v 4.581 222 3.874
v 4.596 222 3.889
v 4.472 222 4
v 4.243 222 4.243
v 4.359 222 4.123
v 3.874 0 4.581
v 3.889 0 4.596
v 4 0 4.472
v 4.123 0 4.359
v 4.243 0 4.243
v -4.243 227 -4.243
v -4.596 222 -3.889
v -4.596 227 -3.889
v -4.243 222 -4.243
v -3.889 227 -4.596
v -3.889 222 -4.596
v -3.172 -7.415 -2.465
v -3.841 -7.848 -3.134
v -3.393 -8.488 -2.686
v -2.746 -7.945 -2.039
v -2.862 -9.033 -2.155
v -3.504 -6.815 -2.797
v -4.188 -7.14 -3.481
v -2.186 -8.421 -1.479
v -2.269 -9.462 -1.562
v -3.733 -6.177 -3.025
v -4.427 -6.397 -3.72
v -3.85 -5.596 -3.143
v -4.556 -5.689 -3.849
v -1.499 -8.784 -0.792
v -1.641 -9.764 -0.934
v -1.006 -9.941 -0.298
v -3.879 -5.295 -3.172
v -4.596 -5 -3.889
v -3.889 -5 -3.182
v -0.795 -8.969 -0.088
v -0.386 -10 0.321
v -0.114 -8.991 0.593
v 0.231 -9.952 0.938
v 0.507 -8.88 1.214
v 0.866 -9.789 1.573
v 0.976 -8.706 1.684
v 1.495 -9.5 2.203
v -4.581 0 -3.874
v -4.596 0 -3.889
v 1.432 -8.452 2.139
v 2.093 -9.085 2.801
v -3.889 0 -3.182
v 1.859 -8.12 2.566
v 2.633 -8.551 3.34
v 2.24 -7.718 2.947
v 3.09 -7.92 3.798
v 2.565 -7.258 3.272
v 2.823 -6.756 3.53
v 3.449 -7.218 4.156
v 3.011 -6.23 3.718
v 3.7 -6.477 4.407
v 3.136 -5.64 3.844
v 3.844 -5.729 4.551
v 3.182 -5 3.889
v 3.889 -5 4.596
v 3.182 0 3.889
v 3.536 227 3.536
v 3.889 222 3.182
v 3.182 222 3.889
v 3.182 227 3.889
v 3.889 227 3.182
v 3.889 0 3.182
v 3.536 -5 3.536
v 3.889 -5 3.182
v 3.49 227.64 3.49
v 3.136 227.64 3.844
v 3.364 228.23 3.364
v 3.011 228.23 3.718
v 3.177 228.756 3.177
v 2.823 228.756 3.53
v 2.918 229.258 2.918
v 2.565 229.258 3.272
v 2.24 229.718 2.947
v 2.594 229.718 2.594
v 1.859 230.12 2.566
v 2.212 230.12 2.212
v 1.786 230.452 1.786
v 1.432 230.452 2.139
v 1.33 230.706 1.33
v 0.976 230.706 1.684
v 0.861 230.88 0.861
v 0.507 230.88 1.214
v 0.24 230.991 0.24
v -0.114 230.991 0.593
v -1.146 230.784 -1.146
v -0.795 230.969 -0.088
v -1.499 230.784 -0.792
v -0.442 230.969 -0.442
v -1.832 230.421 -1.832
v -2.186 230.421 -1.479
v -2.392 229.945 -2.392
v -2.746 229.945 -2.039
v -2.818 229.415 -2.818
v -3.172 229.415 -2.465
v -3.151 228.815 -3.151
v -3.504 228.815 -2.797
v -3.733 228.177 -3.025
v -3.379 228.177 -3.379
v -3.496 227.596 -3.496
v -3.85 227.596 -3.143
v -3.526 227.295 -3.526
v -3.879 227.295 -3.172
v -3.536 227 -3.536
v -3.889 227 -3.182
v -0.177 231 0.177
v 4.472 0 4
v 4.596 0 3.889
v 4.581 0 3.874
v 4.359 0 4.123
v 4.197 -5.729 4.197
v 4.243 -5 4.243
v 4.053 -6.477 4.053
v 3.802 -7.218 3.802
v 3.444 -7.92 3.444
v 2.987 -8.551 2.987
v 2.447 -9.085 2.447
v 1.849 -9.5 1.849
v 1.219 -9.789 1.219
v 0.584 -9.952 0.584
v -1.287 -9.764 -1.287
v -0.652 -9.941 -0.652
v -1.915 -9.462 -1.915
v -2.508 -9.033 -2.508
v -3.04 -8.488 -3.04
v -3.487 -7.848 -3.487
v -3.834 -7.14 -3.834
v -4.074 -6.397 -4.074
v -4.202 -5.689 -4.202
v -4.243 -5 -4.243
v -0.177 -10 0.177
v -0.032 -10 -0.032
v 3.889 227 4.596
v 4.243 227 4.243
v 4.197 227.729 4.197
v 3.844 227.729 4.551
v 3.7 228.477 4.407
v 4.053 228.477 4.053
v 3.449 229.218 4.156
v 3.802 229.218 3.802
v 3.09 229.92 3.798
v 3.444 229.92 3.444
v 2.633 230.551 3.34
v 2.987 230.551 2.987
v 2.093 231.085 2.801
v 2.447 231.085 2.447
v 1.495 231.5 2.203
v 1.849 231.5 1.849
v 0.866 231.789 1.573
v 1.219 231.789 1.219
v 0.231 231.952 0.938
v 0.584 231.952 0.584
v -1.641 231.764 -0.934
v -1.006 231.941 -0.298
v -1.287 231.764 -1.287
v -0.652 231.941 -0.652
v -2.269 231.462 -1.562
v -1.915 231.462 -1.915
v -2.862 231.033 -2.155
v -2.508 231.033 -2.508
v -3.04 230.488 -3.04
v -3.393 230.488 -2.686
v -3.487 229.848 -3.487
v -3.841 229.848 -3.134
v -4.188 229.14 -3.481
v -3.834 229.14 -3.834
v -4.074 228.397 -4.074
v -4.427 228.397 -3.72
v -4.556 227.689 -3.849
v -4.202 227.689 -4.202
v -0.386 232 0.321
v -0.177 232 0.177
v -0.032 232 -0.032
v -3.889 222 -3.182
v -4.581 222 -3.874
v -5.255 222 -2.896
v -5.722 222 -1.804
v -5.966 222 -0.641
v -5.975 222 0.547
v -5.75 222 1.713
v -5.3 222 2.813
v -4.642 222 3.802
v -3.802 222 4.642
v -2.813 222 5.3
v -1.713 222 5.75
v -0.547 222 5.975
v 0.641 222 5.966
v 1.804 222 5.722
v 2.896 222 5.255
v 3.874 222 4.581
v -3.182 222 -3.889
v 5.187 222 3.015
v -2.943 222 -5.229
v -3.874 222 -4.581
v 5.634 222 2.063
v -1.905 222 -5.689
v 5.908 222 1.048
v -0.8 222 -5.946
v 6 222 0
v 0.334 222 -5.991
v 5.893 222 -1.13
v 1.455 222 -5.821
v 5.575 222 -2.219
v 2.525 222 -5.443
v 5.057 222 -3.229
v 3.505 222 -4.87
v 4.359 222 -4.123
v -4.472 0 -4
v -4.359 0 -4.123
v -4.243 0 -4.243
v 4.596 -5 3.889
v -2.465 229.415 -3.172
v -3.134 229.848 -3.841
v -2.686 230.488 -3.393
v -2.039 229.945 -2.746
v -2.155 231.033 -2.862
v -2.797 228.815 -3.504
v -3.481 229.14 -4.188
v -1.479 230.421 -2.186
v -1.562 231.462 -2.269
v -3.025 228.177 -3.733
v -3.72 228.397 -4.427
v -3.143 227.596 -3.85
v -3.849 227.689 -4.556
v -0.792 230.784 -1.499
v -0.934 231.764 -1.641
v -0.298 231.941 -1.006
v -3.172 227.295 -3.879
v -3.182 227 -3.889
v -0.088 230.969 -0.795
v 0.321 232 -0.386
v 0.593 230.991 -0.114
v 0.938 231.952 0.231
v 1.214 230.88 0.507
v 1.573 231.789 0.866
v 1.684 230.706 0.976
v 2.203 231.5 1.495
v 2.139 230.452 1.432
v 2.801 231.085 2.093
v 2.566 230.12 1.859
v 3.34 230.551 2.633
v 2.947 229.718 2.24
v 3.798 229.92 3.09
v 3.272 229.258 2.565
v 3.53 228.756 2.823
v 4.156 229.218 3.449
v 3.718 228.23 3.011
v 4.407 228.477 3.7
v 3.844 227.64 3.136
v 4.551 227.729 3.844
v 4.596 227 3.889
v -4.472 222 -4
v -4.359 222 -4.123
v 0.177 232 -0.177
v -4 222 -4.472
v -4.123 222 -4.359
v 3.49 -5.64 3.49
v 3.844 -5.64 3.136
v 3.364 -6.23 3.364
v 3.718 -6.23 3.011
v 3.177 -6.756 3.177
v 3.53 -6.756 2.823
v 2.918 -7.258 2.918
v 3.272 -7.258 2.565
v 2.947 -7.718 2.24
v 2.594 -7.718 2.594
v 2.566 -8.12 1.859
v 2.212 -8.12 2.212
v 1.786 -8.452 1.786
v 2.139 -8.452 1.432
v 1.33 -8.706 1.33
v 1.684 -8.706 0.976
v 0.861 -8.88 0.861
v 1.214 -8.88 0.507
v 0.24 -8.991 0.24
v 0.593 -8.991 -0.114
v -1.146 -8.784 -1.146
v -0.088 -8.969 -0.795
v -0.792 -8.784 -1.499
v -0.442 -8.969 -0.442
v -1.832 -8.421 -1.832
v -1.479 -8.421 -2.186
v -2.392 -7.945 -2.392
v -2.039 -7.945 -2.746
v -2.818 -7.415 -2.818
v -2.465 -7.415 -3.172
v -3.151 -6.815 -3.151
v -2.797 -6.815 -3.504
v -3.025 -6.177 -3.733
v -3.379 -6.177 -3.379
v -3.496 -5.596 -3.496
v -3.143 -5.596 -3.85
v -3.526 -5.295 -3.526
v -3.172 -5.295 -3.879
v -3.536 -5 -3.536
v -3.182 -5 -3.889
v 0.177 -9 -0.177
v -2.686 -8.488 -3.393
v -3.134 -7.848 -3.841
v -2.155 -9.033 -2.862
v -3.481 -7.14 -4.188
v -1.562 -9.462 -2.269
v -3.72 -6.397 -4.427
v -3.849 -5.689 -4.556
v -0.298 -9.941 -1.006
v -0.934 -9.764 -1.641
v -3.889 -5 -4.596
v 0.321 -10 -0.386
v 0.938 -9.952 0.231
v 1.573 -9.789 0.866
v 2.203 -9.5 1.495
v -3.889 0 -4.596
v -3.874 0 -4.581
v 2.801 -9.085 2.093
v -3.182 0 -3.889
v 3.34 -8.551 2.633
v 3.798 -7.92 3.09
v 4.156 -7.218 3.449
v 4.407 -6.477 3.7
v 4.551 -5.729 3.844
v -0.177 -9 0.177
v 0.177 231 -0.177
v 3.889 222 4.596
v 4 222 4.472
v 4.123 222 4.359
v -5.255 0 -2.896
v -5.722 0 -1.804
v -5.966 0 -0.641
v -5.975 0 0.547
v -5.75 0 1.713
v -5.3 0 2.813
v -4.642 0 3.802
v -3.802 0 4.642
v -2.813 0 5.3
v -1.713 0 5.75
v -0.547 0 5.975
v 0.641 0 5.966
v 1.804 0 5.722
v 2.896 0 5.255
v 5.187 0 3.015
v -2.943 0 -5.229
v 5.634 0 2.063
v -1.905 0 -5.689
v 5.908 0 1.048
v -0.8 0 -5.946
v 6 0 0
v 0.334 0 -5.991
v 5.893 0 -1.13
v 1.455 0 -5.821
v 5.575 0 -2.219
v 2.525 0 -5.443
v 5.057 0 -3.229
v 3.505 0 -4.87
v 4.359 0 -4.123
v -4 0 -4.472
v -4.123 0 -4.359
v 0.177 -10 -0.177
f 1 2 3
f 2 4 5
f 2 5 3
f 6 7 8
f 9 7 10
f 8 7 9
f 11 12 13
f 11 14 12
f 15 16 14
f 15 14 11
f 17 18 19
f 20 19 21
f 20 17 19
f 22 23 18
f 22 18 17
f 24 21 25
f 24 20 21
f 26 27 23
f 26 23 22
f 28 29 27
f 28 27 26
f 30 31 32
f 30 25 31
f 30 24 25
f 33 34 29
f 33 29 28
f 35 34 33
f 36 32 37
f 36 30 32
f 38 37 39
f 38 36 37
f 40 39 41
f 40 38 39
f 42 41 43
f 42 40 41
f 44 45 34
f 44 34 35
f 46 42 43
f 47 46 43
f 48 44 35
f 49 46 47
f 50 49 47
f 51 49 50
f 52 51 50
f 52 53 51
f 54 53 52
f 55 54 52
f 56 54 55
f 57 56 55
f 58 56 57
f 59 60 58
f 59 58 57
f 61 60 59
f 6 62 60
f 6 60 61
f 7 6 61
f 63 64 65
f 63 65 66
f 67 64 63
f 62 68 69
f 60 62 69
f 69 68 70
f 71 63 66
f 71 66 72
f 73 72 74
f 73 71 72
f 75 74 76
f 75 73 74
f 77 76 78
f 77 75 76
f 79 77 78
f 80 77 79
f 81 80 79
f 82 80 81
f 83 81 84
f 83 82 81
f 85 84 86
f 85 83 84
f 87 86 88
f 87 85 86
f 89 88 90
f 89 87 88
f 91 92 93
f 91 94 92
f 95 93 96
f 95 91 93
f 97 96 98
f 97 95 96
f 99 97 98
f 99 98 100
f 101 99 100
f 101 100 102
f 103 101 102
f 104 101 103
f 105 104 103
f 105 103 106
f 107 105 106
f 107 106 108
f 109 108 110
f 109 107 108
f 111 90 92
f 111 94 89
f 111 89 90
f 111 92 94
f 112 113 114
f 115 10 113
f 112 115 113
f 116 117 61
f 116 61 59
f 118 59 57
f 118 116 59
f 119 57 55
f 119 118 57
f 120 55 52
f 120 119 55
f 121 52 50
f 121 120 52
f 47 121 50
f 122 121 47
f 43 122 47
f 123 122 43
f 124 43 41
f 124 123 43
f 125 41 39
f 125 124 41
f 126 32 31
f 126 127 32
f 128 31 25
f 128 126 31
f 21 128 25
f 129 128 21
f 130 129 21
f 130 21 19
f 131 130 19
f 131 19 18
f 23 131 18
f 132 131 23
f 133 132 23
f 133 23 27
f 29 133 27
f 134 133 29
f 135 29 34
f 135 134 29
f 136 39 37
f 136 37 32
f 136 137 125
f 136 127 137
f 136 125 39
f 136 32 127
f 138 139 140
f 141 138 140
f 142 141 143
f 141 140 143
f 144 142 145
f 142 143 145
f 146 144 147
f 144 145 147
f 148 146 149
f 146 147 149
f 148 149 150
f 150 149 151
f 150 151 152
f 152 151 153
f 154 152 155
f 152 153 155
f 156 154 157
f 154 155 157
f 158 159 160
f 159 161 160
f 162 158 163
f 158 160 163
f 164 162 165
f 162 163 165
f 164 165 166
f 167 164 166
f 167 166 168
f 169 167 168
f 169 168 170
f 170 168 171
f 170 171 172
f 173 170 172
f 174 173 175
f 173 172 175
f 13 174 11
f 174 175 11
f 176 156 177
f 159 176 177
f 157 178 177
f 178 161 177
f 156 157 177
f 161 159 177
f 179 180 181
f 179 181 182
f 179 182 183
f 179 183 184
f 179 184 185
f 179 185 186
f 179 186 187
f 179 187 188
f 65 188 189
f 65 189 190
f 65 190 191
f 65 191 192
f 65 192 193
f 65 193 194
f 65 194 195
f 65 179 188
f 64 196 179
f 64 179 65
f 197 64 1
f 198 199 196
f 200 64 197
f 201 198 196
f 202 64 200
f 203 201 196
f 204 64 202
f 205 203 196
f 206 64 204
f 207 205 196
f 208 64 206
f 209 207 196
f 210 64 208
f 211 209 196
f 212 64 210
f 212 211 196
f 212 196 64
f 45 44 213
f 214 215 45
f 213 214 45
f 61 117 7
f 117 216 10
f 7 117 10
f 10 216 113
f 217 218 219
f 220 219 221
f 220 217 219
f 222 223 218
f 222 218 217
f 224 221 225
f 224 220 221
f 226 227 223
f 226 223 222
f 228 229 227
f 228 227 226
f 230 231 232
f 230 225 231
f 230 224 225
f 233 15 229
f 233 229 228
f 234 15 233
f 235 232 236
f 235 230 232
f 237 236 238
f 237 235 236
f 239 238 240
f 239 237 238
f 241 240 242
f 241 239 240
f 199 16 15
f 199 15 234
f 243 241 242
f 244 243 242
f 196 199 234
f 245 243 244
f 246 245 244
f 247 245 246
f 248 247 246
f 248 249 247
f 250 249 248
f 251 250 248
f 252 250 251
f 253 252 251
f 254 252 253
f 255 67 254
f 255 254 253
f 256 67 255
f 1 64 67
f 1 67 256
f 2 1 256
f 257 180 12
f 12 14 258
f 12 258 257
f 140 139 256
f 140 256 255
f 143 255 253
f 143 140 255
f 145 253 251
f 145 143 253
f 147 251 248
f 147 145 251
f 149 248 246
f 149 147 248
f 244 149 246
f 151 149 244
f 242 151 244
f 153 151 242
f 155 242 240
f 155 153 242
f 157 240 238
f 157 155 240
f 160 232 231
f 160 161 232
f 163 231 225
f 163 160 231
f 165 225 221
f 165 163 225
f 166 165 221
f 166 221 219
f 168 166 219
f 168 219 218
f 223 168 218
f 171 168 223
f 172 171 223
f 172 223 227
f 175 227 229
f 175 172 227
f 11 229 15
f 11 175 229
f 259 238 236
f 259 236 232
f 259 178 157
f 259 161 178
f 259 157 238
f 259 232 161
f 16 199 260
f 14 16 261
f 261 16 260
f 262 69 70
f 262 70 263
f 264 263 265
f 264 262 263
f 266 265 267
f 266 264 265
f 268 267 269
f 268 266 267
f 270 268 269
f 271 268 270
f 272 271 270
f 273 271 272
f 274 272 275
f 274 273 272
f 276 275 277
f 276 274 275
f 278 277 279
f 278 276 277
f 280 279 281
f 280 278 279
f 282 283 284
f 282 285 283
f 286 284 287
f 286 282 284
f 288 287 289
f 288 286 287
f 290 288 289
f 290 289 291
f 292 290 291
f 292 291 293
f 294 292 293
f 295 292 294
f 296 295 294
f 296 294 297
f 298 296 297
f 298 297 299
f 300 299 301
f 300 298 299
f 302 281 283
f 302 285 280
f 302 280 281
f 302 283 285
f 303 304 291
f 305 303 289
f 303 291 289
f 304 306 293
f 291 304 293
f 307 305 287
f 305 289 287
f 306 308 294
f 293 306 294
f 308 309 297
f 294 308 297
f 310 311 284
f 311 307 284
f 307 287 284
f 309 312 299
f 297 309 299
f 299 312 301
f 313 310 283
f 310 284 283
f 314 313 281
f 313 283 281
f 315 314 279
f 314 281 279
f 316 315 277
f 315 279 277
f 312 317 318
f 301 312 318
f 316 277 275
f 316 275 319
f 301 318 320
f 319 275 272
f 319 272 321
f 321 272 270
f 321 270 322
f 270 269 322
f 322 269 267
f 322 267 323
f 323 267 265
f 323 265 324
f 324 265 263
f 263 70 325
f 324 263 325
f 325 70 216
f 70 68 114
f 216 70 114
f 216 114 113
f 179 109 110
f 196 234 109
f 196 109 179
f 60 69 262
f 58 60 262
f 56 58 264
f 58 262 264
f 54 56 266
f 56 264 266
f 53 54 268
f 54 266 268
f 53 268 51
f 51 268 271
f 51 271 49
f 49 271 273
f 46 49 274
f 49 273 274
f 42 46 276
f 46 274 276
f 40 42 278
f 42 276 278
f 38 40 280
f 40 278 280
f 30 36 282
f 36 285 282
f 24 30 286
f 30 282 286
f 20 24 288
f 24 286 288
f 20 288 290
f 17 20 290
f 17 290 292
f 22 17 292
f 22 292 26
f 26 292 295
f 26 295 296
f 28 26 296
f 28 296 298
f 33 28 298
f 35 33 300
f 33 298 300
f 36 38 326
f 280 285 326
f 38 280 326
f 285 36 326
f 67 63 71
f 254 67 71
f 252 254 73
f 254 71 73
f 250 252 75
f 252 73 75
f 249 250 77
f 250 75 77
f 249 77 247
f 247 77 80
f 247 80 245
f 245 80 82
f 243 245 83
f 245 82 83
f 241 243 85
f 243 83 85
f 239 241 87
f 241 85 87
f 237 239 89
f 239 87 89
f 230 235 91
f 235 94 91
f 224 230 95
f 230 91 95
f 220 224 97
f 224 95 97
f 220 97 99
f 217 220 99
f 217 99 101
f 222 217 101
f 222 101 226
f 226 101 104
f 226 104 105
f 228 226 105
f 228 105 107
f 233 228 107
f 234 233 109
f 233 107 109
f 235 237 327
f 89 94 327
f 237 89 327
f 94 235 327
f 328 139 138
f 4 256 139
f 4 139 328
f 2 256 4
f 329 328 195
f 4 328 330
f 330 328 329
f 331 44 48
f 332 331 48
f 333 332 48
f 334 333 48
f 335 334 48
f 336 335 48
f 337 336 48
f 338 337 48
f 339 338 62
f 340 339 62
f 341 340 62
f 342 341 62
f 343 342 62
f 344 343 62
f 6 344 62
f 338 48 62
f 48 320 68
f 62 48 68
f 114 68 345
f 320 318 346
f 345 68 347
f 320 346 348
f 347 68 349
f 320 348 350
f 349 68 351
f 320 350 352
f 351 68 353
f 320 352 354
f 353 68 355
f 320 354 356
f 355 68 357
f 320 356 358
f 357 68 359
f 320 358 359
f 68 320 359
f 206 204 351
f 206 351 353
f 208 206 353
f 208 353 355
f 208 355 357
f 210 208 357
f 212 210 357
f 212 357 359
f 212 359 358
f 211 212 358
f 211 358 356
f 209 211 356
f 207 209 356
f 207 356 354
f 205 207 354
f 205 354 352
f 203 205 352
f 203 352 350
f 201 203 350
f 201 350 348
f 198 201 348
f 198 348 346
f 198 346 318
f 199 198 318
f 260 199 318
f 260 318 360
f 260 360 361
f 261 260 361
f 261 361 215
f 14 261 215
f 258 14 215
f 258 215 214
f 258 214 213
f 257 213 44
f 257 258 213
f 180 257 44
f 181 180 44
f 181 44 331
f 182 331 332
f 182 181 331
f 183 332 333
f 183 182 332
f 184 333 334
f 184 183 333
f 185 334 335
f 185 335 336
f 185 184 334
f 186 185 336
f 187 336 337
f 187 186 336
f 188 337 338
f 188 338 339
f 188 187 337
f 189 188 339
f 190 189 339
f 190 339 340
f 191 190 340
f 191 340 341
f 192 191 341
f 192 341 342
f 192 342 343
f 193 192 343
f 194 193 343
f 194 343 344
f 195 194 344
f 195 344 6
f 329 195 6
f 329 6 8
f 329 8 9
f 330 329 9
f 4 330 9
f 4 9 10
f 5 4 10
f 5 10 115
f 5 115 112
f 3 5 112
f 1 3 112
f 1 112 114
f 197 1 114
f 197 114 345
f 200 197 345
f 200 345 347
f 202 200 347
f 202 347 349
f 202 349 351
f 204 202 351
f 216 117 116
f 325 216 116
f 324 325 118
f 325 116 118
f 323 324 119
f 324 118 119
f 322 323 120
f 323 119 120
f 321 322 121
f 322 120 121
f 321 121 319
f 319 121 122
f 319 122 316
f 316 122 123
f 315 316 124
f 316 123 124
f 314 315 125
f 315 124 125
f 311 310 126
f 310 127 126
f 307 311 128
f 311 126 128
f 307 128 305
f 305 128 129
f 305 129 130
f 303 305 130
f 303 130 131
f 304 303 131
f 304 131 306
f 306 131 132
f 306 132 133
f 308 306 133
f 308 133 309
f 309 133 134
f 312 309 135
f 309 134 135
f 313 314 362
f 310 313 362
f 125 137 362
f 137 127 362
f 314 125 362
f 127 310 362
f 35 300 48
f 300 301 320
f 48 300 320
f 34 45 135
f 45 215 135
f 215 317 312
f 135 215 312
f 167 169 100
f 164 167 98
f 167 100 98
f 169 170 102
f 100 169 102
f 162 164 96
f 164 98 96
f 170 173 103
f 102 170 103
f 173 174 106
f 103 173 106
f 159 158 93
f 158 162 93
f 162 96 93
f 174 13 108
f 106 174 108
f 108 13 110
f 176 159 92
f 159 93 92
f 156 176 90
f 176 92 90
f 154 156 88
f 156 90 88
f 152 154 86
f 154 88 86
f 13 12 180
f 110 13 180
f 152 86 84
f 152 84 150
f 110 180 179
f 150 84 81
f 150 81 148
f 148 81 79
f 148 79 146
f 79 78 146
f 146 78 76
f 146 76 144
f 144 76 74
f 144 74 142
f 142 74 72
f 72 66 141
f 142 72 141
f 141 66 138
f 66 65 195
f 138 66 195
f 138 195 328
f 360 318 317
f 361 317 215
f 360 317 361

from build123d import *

# Parameters (mm, degrees)
SKETCH1_R           = 6
BOSS_EXTRUDE2_DEPTH = 111
BOSS_EXTRUDE4_DEPTH = 0.5


with BuildPart() as part:
    # Sketch1 → Boss-Extrude2 (new body)
    with BuildSketch(Plane(origin=(0, 0, 0), x_dir=(1, 0, 0), z_dir=(0, 1, 0))):
        Circle(SKETCH1_R)
    boss_extrude2 = extrude(amount=BOSS_EXTRUDE2_DEPTH)

    # Sketch4 → Boss-Extrude4 (add, symmetric)
    with BuildSketch(Plane(origin=(0, 0, 0), x_dir=(-0.7071067811865477, 0, -0.7071067811865475), z_dir=(0.7071067811865475, 0, -0.7071067811865477))):
        with BuildLine():
            Line((5, -5), (5, 0))
            Line((5, 0), (6, 0))
            Line((6, 0), (6, -5))
            add(Edge.make_bspline(
                [(-6, -5), (-6, -10), (0, -10), (6, -10), (6, -5)],
                knots=[3.141592654, 3.141592654, 3.141592654, 4.71238898, 4.71238898, 6.283185307, 6.283185307, 6.283185307], degree=2, weights=[1, 0.707106781, 1, 0.707106781, 1]))
            Line((-6, -5), (-6, 0))
            Line((-6, 0), (-5, 0))
            Line((-5, 0), (-5, -5))
            add(Edge.make_bspline(
                [(-5, -5), (-5, -9), (0, -9), (5, -9), (5, -5)],
                knots=[3.141592654, 3.141592654, 3.141592654, 4.71238898, 4.71238898, 6.283185307, 6.283185307, 6.283185307], degree=2, weights=[1, 0.707106781, 1, 0.707106781, 1]))
        make_face()
    boss_extrude4 = extrude(amount=BOSS_EXTRUDE4_DEPTH, both=True)

    # Mirror1: Boss-Extrude2, Boss-Extrude4 across plane
    add(boss_extrude2.mirror(Plane.ZX.offset(111)))
    add(boss_extrude4.mirror(Plane.ZX.offset(111)))


solid = part.part
